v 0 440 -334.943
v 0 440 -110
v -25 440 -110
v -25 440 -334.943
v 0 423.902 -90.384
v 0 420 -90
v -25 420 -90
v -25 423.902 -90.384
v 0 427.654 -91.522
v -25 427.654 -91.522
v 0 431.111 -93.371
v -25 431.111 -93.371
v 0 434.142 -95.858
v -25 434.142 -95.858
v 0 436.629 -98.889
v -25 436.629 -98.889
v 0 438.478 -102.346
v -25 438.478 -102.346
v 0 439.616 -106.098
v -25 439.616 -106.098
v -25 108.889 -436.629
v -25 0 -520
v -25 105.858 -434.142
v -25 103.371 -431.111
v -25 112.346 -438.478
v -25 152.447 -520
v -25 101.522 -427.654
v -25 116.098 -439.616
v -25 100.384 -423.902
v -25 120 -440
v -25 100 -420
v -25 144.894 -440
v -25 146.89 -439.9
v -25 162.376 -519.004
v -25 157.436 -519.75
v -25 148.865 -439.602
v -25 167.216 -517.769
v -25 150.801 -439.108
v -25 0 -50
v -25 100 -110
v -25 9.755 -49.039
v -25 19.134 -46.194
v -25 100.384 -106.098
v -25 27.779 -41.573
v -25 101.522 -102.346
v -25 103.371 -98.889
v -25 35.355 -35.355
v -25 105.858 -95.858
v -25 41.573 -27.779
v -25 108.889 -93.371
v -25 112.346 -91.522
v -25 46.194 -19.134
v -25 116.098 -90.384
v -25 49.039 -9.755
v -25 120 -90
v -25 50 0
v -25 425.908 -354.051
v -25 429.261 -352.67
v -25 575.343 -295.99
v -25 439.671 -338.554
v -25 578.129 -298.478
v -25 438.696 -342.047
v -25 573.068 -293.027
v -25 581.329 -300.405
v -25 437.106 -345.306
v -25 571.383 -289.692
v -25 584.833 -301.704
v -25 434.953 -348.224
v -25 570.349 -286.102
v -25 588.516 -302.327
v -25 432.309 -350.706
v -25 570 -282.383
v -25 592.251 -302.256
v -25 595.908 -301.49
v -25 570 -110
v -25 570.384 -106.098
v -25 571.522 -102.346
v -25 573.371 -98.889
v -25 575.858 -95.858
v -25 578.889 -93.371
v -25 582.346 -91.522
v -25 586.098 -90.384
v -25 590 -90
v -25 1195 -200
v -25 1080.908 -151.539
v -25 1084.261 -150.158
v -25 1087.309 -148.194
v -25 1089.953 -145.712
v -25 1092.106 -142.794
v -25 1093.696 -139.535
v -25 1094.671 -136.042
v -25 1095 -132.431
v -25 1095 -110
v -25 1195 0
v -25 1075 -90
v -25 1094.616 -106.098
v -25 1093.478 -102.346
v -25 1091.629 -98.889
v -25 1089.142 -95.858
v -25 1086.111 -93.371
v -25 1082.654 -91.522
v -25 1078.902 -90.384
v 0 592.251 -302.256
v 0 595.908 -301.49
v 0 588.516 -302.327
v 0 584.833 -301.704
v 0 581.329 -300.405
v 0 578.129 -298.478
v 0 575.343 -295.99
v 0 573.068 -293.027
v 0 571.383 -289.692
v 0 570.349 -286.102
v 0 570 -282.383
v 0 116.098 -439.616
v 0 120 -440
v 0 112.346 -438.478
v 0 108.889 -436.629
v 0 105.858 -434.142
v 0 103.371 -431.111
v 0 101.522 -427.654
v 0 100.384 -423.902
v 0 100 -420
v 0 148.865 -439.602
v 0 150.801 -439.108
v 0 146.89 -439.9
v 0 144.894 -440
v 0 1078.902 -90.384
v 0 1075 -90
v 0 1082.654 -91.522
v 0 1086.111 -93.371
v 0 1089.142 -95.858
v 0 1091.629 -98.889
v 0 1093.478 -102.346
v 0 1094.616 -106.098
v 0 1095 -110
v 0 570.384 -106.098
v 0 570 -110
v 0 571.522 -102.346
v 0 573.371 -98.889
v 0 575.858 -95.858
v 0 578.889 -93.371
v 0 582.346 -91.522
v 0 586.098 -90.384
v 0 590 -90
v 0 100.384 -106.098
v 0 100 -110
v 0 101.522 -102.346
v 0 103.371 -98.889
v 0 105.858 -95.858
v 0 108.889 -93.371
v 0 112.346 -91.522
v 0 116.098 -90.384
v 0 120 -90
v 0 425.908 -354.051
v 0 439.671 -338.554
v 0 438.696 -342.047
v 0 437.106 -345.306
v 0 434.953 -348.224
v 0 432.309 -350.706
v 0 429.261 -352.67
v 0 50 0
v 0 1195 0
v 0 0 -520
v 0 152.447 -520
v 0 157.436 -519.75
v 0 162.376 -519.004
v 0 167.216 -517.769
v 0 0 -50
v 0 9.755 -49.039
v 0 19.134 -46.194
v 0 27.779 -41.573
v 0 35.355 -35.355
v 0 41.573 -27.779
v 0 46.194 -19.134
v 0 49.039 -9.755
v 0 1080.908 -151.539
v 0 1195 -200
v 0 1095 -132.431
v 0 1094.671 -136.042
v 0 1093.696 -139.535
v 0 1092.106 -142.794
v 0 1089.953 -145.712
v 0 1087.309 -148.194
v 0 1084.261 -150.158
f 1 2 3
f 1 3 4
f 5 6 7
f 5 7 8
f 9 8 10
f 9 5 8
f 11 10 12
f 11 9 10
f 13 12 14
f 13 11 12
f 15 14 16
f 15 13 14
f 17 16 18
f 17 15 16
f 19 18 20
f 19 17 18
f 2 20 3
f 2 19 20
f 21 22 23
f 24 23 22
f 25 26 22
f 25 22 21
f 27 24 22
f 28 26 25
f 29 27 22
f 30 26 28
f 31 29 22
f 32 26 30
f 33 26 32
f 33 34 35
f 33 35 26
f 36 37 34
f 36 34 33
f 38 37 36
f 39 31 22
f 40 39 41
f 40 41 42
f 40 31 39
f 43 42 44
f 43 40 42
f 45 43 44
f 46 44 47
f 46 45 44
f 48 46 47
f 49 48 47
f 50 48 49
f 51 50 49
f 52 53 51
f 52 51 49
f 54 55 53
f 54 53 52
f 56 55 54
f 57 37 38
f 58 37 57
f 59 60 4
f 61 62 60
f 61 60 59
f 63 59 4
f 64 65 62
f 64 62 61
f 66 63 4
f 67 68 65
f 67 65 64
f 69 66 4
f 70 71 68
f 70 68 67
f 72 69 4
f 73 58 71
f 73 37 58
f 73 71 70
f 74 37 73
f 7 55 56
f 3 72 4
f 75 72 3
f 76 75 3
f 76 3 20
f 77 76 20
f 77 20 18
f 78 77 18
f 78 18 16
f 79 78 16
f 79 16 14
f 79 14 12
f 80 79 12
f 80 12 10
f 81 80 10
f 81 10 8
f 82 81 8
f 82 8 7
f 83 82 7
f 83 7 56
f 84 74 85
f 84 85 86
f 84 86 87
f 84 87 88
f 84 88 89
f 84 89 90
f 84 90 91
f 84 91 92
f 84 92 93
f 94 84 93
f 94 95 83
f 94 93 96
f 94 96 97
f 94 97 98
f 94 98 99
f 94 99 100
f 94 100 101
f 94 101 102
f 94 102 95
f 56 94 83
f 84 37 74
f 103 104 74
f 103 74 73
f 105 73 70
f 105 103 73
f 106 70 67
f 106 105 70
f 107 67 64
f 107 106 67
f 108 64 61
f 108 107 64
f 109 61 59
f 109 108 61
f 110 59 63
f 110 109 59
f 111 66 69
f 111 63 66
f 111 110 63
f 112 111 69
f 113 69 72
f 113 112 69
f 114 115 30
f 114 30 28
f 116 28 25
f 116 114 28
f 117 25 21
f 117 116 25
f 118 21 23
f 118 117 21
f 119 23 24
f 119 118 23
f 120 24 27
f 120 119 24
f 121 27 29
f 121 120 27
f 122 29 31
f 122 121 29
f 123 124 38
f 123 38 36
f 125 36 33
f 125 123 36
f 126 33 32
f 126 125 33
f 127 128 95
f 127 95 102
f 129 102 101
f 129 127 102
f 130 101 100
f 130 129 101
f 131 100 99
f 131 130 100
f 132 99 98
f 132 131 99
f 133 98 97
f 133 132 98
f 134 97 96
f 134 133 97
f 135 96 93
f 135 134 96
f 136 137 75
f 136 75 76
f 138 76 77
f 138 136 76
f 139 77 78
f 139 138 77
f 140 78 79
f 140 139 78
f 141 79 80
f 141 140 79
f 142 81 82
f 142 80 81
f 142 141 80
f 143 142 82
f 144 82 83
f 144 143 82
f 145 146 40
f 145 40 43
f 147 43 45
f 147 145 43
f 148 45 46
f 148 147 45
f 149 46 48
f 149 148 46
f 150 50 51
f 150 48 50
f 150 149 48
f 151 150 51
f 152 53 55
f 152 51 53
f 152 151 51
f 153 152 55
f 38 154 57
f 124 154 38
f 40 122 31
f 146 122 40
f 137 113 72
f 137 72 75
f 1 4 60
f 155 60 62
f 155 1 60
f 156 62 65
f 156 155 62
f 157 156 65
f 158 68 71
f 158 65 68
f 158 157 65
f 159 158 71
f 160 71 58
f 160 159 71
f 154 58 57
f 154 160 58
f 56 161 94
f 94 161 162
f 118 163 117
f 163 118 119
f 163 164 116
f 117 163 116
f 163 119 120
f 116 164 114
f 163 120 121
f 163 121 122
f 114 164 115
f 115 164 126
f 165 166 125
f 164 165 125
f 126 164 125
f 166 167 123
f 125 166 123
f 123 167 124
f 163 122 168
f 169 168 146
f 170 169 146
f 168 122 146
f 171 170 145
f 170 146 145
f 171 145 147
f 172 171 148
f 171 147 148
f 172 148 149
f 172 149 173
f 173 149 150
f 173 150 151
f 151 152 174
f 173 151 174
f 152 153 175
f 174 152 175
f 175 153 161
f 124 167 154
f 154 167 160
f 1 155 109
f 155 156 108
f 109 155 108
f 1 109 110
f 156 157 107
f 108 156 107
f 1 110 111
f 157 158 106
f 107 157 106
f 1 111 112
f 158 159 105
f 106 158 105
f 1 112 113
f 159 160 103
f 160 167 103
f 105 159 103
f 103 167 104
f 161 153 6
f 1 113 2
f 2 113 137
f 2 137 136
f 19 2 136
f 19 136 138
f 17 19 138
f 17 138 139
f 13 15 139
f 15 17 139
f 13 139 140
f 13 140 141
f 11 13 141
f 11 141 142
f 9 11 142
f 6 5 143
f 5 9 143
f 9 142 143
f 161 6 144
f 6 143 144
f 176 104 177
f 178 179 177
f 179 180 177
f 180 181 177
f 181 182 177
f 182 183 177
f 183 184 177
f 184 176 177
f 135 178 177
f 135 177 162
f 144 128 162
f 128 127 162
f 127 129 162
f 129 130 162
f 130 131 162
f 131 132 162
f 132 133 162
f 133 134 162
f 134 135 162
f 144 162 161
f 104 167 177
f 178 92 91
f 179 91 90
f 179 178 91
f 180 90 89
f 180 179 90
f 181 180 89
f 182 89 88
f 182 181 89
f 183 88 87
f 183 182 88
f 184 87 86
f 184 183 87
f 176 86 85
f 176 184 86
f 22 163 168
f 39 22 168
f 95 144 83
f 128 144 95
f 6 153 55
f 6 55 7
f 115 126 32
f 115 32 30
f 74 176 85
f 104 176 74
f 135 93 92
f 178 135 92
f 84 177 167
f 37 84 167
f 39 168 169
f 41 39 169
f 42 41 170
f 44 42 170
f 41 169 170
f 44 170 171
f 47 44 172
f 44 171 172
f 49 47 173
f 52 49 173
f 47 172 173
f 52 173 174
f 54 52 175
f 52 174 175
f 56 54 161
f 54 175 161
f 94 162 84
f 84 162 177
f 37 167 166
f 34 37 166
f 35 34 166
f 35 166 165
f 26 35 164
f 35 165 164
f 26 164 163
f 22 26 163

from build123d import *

# Parameters (mm, degrees)
BOSS_EXTRUDE1_DEPTH = 25
CUT_EXTRUDE1_REACH  = 1305.476


with BuildPart() as part:
    # Sketch1 → Boss-Extrude1 (new body)
    with BuildSketch(Plane(origin=(0, 0, 0), x_dir=(0, 0, -1), z_dir=(1, 0, 0))):
        with BuildLine():
            Line((0, 50), (0, 1195))
            Line((0, 1195), (200, 1195))
            Line((200, 1195), (517.768948114, 167.216058445))
            ThreePointArc((517.768948114, 167.216058445), (519.439090838, 159.915268109), (520, 152.446915067))
            Line((520, 152.446915067), (520, 0))
            Line((520, 0), (50, 0))
            ThreePointArc((50, 0), (35.355339059, 35.355339059), (0, 50))
        make_face()
    extrude(amount=-BOSS_EXTRUDE1_DEPTH)

    # Sketch2 → Cut-Extrude1 (cut, up to next)
    with BuildSketch(Plane(origin=(0, 0, 0), x_dir=(0, 0, -1), z_dir=(1, 0, 0)), mode=Mode.PRIVATE) as cut_extrude1_sk1:
        with BuildLine():
            Line((90, 120), (90, 420))
            ThreePointArc((90, 420), (95.857864376, 434.142135624), (110, 440))
            Line((110, 440), (334.943019945, 440))
            ThreePointArc((334.943019945, 440), (346.814137267, 436.095855787), (354.05059919, 425.907657351))
            Line((354.05059919, 425.907657351), (439.107579245, 150.801487485))
            ThreePointArc((439.107579245, 150.801487485), (439.775636335, 147.881171351), (440, 144.893830134))
            Line((440, 144.893830134), (440, 120))
            ThreePointArc((440, 120), (434.142135624, 105.857864376), (420, 100))
            Line((420, 100), (110, 100))
            ThreePointArc((110, 100), (95.857864376, 105.857864376), (90, 120))
        make_face()
    cut_extrude1_tool1 = extrude(cut_extrude1_sk1.sketch, amount=-CUT_EXTRUDE1_REACH, mode=Mode.PRIVATE) & part.part
    # Sketch2 → Cut-Extrude1 (cut, up to next)
    with BuildSketch(Plane(origin=(0, 0, 0), x_dir=(0, 0, -1), z_dir=(1, 0, 0)), mode=Mode.PRIVATE) as cut_extrude1_sk2:
        with BuildLine():
            Line((90, 590), (90, 1075))
            ThreePointArc((90, 1075), (95.857864376, 1089.142135624), (110, 1095))
            Line((110, 1095), (132.43094265, 1095))
            ThreePointArc((132.43094265, 1095), (144.302059973, 1091.095855787), (151.538521896, 1080.907657351))
            Line((151.538521896, 1080.907657351), (301.490212717, 595.907657351))
            ThreePointArc((301.490212717, 595.907657351), (298.478489258, 578.128882677), (282.382633471, 570))
            Line((282.382633471, 570), (110, 570))
            ThreePointArc((110, 570), (95.857864376, 575.857864376), (90, 590))
        make_face()
    cut_extrude1_tool2 = extrude(cut_extrude1_sk2.sketch, amount=-CUT_EXTRUDE1_REACH, mode=Mode.PRIVATE) & part.part
    add(cut_extrude1_tool1.solids().sort_by_distance((0, 260.991144, -246.99454))[0], mode=Mode.SUBTRACT)
    add(cut_extrude1_tool2.solids().sort_by_distance((0, 781.346957, -166.978745))[0], mode=Mode.SUBTRACT)


solid = part.part
